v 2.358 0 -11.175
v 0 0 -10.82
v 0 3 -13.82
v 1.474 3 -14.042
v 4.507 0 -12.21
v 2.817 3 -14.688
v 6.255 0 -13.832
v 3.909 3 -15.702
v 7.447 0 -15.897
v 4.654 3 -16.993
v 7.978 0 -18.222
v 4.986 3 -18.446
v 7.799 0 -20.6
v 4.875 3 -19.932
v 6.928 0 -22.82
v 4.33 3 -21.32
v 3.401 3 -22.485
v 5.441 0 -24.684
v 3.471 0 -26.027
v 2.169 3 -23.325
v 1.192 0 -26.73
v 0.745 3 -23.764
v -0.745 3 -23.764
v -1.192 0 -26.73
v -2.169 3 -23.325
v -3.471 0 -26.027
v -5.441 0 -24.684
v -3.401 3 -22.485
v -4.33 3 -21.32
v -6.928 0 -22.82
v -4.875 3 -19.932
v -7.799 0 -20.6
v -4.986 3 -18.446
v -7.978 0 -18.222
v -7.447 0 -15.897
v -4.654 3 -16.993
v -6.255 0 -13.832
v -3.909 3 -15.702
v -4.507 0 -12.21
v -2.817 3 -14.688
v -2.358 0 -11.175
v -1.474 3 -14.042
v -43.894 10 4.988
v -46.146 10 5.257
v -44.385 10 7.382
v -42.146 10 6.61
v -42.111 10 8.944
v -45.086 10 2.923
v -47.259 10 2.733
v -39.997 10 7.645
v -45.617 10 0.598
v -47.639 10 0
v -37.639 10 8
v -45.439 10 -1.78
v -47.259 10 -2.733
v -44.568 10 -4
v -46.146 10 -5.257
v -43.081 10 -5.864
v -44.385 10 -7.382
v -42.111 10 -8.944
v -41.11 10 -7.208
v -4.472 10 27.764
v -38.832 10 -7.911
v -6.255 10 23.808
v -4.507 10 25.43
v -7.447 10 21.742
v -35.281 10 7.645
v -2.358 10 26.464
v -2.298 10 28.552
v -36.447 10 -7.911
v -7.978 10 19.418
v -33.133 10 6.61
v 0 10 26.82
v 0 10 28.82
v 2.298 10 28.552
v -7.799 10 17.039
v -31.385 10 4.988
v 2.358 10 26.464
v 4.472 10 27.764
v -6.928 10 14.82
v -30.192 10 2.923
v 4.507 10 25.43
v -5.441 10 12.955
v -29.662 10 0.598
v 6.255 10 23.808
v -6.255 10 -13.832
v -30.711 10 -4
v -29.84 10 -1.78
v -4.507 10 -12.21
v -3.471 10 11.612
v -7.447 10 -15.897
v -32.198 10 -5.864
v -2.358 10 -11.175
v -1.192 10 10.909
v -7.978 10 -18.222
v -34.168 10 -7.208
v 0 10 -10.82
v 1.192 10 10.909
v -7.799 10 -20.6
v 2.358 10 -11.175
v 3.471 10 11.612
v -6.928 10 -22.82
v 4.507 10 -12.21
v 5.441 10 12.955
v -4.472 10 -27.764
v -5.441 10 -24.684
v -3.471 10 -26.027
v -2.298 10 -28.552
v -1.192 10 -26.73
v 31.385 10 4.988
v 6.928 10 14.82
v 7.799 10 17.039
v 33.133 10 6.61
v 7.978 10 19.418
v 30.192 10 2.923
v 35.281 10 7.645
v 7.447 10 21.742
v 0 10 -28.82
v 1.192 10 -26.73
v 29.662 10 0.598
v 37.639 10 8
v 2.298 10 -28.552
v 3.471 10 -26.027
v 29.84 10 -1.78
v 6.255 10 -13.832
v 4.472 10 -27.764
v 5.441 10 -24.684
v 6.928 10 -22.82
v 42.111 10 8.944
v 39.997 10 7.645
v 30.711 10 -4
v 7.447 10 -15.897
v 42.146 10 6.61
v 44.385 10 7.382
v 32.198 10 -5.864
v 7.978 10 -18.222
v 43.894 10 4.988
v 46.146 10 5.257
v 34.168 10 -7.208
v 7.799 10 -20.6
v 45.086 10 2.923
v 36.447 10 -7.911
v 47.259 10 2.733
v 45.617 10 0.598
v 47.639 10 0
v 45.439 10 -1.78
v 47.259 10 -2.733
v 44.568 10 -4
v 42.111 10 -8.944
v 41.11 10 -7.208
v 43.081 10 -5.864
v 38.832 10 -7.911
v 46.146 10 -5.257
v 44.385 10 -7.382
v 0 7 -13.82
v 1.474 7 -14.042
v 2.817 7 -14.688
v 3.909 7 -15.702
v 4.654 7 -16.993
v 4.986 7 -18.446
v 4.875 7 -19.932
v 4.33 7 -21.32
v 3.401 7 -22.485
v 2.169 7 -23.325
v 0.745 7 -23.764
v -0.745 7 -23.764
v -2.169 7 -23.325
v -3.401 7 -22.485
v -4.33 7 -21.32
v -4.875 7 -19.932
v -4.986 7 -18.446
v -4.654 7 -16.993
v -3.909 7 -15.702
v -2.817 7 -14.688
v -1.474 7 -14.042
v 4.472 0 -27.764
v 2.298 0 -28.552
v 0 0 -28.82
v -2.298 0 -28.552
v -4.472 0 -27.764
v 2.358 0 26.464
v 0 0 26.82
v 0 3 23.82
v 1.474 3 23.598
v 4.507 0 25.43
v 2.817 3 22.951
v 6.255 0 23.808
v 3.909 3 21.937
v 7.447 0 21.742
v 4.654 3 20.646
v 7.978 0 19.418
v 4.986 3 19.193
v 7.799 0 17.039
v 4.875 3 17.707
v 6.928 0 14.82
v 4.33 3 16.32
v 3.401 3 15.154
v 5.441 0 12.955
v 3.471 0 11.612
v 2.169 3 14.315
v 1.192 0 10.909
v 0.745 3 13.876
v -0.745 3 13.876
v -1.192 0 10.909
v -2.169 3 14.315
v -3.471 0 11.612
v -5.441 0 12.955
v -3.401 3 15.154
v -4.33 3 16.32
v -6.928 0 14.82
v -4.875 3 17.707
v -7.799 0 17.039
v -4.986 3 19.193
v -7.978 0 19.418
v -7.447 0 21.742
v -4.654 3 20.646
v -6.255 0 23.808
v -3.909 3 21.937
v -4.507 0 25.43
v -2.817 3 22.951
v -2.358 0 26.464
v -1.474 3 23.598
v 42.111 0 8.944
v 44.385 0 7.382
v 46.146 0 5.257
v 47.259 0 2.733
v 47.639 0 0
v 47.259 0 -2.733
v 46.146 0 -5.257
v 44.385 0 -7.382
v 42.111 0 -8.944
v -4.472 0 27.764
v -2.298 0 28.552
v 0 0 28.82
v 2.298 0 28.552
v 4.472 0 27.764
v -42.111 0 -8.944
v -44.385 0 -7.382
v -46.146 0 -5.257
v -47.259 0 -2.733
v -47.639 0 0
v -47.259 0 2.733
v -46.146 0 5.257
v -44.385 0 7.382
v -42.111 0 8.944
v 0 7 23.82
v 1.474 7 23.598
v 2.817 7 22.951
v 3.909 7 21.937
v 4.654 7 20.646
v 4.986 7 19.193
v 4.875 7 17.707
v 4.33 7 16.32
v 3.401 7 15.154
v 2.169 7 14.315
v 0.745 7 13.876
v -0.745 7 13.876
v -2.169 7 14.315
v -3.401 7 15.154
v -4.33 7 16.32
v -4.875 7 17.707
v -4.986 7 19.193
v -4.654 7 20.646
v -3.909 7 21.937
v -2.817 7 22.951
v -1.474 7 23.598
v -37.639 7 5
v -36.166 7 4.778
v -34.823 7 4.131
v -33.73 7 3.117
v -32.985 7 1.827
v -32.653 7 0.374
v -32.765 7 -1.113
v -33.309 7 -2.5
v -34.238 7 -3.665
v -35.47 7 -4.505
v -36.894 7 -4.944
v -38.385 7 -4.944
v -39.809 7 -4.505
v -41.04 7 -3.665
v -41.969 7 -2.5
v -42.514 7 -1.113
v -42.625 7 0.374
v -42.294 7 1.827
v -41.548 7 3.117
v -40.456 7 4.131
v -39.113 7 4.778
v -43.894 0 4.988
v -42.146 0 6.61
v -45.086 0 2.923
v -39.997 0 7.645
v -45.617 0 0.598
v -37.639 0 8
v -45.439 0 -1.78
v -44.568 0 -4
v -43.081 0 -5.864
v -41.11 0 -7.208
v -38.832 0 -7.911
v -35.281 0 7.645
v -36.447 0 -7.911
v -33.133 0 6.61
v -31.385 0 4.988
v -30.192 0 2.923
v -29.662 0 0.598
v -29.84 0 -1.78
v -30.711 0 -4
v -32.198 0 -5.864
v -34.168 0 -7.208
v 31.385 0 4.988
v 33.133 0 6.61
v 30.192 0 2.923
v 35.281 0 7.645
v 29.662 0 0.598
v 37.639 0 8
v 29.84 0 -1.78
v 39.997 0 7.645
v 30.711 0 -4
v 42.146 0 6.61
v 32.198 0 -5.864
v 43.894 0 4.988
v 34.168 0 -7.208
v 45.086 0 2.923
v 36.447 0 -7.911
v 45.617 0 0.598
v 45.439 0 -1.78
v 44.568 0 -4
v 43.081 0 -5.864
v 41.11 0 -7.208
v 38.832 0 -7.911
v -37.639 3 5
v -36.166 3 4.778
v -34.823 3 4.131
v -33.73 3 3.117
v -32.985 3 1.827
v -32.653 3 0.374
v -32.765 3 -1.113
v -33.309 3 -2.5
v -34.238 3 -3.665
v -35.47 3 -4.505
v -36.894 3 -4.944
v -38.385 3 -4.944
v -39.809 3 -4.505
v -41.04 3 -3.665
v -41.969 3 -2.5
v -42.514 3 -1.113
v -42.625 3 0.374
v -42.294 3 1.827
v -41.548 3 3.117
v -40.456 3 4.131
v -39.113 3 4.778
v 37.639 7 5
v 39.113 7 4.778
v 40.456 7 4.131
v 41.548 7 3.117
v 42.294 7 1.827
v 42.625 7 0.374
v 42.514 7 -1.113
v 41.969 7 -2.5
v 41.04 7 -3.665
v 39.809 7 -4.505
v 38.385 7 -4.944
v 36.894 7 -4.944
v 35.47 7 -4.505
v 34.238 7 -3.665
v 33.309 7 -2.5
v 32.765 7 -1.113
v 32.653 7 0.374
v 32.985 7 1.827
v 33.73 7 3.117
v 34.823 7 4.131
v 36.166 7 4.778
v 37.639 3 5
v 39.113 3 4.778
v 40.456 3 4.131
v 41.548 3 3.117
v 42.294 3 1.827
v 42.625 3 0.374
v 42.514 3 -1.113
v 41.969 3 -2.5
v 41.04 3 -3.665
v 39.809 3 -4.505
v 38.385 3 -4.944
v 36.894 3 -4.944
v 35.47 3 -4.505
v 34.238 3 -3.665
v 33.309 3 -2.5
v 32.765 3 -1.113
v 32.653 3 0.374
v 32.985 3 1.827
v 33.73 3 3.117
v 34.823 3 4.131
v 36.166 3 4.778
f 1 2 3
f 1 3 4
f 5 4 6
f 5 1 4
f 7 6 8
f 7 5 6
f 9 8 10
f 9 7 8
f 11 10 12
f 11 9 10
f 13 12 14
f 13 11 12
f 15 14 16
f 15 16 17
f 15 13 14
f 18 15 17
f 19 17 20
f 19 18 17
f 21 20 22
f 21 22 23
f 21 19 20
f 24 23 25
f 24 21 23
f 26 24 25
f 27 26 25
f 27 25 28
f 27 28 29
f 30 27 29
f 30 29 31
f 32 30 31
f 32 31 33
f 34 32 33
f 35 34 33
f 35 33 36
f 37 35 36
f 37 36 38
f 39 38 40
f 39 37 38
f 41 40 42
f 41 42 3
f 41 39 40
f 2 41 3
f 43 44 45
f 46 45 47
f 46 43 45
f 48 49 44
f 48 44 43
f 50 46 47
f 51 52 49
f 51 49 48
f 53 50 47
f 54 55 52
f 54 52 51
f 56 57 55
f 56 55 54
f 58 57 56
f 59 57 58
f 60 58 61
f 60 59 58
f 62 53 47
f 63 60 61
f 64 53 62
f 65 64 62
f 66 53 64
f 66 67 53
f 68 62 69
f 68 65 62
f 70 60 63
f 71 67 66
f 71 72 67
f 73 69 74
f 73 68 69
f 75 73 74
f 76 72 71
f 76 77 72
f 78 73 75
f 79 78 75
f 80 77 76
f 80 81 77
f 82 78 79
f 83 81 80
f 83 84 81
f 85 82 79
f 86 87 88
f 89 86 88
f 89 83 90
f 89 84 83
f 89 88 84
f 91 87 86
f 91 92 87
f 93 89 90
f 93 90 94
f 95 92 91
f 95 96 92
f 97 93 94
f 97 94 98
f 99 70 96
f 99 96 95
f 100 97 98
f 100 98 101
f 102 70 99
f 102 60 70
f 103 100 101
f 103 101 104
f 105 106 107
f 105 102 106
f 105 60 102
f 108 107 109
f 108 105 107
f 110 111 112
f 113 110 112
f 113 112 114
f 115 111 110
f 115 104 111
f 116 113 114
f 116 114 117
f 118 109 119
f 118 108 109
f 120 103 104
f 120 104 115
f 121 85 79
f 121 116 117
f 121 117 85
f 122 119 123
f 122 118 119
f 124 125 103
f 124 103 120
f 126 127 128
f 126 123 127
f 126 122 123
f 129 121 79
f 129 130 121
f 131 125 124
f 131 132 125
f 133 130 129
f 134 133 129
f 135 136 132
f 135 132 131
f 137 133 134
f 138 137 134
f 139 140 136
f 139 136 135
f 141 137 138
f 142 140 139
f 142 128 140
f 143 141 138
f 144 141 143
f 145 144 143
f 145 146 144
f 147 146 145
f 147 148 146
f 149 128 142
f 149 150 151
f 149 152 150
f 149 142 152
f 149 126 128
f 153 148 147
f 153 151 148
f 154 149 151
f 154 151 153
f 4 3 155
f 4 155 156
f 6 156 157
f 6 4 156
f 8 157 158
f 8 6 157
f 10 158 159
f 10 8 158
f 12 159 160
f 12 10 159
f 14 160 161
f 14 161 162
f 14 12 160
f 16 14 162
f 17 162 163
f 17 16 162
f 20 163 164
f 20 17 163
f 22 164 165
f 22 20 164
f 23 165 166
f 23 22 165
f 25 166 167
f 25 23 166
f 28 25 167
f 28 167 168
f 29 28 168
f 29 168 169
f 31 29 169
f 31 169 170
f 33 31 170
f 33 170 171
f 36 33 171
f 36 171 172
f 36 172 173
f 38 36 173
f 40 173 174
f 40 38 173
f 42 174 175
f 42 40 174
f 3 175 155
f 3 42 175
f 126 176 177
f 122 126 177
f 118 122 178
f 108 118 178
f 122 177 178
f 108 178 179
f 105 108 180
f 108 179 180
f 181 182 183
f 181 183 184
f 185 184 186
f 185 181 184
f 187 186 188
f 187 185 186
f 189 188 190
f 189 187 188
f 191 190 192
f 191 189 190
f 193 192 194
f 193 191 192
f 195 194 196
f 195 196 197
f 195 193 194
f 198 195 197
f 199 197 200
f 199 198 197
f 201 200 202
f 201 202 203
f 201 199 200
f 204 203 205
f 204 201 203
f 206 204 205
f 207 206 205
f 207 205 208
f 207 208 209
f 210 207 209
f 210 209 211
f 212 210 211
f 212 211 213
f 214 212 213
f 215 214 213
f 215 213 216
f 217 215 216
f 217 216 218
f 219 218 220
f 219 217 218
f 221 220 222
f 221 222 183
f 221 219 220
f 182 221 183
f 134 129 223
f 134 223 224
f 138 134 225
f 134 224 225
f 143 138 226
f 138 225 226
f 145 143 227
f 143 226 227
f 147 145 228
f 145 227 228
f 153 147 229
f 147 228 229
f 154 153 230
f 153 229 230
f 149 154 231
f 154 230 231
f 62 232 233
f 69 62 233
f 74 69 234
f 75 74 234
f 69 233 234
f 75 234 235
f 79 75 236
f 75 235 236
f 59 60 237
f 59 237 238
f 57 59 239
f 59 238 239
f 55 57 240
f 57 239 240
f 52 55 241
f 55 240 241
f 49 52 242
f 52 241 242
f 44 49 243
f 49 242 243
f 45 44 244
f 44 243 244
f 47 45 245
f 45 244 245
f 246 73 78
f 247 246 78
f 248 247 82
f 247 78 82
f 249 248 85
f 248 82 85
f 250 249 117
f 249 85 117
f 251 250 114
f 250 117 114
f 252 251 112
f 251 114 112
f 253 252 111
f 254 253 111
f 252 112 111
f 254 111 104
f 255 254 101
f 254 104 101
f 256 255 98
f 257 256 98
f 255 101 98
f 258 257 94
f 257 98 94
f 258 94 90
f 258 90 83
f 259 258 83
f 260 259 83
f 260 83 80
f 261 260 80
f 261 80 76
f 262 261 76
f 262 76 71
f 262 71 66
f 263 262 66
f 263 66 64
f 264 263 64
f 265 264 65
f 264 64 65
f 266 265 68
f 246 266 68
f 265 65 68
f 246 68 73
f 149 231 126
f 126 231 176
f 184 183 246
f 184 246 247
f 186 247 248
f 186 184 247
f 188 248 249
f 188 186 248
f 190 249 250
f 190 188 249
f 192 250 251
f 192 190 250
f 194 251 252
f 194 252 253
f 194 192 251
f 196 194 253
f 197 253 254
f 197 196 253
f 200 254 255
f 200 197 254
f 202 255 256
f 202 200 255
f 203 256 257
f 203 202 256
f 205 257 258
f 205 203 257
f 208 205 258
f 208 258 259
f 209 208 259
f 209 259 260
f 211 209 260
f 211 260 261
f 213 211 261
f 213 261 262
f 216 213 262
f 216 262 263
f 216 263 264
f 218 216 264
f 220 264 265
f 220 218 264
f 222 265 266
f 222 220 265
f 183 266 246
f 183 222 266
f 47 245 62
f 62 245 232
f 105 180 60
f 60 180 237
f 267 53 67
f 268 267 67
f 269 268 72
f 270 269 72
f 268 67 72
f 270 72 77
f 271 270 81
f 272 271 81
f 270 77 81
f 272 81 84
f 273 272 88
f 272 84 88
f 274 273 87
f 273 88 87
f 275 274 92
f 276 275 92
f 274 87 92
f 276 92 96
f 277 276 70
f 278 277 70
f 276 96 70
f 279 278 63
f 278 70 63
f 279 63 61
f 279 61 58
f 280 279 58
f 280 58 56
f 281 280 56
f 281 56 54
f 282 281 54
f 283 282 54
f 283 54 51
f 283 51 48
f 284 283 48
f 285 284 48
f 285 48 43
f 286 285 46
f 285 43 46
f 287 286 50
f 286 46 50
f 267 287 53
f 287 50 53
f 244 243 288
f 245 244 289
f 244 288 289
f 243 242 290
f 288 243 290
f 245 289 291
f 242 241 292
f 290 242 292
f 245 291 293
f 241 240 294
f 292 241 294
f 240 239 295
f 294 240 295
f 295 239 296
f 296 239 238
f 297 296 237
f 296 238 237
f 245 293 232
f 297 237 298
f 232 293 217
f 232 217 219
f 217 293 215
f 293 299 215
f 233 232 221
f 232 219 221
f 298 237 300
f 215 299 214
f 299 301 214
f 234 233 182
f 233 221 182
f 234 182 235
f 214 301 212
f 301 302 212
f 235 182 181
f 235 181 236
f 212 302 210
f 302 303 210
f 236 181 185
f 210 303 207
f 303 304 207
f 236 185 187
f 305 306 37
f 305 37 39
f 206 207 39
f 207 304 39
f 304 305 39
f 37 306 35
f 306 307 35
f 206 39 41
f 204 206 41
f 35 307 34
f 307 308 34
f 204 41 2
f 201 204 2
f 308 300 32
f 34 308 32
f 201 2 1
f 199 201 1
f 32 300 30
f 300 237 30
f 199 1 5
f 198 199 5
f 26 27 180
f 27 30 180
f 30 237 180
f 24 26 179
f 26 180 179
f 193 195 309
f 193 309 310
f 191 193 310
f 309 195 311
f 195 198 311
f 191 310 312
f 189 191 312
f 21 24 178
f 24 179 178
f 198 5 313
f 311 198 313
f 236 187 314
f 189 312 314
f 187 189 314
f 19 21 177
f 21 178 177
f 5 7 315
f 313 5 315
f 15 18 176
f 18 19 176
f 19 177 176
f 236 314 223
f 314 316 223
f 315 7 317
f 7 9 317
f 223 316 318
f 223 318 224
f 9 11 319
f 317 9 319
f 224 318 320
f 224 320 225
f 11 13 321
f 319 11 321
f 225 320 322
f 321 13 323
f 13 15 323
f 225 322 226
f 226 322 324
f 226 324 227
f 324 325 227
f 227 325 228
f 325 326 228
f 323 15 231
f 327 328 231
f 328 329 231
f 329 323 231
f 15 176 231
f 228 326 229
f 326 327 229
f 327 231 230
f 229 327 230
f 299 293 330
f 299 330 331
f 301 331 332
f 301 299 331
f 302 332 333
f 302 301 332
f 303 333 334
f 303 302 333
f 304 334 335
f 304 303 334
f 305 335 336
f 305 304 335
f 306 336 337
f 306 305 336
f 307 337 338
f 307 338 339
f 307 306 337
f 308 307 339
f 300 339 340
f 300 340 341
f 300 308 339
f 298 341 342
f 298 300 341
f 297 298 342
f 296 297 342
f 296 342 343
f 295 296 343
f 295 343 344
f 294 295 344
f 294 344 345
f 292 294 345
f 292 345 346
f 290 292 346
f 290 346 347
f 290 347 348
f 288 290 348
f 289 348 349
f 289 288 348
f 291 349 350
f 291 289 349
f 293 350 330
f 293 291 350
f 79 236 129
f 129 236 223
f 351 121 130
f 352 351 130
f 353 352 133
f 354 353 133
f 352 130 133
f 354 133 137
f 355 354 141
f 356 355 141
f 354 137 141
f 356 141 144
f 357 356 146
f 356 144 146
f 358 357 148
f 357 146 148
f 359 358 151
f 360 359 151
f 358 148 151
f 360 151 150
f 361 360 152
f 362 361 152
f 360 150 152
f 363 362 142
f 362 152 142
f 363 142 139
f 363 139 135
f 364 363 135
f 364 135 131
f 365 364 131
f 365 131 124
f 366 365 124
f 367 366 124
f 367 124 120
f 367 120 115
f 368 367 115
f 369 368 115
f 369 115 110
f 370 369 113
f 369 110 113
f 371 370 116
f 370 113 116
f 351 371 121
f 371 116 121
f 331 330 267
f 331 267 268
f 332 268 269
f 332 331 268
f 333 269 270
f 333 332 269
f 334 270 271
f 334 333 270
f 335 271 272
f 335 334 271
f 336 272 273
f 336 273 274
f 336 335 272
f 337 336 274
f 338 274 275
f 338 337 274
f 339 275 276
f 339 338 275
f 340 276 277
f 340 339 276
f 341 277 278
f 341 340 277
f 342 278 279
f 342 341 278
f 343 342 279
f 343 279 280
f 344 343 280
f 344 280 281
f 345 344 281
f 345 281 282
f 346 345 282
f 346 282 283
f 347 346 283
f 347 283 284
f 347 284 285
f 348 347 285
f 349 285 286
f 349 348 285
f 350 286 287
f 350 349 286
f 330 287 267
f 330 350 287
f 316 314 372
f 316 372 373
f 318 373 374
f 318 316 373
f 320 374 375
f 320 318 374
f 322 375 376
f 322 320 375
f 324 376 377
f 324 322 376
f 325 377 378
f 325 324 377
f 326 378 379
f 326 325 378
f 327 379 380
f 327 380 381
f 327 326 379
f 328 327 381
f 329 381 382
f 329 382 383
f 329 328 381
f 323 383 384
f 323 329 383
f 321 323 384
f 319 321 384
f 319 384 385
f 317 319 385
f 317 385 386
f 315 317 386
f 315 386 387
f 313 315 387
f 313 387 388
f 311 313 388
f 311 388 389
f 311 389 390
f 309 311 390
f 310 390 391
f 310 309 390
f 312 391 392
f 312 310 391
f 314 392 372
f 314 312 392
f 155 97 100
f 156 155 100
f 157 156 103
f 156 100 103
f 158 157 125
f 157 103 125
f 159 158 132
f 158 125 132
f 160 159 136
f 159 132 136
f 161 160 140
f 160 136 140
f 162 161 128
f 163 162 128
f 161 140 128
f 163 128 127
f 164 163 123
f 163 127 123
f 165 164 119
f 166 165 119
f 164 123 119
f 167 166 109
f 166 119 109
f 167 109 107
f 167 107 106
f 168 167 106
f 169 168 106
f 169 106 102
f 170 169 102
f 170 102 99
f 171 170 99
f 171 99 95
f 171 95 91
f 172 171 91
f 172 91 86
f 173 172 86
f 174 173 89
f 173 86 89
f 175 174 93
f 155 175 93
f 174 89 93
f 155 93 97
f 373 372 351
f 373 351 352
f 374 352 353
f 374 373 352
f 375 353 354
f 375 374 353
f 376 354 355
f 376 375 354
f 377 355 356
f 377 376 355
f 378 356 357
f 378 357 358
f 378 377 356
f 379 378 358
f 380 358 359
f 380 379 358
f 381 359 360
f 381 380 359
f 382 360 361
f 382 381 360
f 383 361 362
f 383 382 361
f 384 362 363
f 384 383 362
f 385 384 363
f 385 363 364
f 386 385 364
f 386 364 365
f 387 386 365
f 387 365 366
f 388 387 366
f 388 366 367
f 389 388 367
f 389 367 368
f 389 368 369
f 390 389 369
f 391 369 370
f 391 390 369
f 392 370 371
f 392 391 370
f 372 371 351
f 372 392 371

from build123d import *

# Parameters (mm, degrees)
SKETCH1_R           = 5
BOSS_EXTRUDE1_DEPTH = 10
CHAMFER1_SIZE       = 3


with BuildPart() as part:
    # Sketch1 → Boss-Extrude1 (new body)
    with BuildSketch(Plane(origin=(0, 0, 0), x_dir=(1, 0, 0), z_dir=(0, 1, 0))):
        with BuildLine():
            Line((-4.472135955, 27.763932023), (-42.11145618, 8.94427191))
            ThreePointArc((-42.11145618, 8.94427191), (-47.639320225, 0), (-42.11145618, -8.94427191))
            Line((-42.11145618, -8.94427191), (-4.472135955, -27.763932023))
            ThreePointArc((-4.472135955, -27.763932023), (0, -28.819660113), (4.472135955, -27.763932023))
            Line((4.472135955, -27.763932023), (42.11145618, -8.94427191))
            ThreePointArc((42.11145618, -8.94427191), (47.639320225, 0), (42.11145618, 8.94427191))
            Line((42.11145618, 8.94427191), (4.472135955, 27.763932023))
            ThreePointArc((4.472135955, 27.763932023), (0, 28.819660113), (-4.472135955, 27.763932023))
        make_face()
        with Locations(Location((0, 18.819660113, 0), (0, 0, 270))):
            Circle(SKETCH1_R, mode=Mode.SUBTRACT)
        with Locations(Location((37.639320225, 0, 0), (0, 0, 270))):
            Circle(SKETCH1_R, mode=Mode.SUBTRACT)
        with Locations(Location((0, -18.819660113, 0), (0, 0, 270))):
            Circle(SKETCH1_R, mode=Mode.SUBTRACT)
        with Locations(Location((-37.639320225, 0, 0), (0, 0, 270))):
            Circle(SKETCH1_R, mode=Mode.SUBTRACT)
    extrude(amount=BOSS_EXTRUDE1_DEPTH)

    # Chamfer1
    chamfer1_edges = [part.edges().sort_by_distance(p)[0] for p in [
        (0, 0, -23.819660113),
        (0, 10, -23.819660113),
        (37.639320225, 0, -5),
        (37.639320225, 10, -5),
        (0, 0, 13.819660113),
        (0, 10, 13.819660113),
        (-37.639320225, 0, -5),
        (-37.639320225, 10, -5),
    ]]
    chamfer(chamfer1_edges, length=CHAMFER1_SIZE)


solid = part.part
